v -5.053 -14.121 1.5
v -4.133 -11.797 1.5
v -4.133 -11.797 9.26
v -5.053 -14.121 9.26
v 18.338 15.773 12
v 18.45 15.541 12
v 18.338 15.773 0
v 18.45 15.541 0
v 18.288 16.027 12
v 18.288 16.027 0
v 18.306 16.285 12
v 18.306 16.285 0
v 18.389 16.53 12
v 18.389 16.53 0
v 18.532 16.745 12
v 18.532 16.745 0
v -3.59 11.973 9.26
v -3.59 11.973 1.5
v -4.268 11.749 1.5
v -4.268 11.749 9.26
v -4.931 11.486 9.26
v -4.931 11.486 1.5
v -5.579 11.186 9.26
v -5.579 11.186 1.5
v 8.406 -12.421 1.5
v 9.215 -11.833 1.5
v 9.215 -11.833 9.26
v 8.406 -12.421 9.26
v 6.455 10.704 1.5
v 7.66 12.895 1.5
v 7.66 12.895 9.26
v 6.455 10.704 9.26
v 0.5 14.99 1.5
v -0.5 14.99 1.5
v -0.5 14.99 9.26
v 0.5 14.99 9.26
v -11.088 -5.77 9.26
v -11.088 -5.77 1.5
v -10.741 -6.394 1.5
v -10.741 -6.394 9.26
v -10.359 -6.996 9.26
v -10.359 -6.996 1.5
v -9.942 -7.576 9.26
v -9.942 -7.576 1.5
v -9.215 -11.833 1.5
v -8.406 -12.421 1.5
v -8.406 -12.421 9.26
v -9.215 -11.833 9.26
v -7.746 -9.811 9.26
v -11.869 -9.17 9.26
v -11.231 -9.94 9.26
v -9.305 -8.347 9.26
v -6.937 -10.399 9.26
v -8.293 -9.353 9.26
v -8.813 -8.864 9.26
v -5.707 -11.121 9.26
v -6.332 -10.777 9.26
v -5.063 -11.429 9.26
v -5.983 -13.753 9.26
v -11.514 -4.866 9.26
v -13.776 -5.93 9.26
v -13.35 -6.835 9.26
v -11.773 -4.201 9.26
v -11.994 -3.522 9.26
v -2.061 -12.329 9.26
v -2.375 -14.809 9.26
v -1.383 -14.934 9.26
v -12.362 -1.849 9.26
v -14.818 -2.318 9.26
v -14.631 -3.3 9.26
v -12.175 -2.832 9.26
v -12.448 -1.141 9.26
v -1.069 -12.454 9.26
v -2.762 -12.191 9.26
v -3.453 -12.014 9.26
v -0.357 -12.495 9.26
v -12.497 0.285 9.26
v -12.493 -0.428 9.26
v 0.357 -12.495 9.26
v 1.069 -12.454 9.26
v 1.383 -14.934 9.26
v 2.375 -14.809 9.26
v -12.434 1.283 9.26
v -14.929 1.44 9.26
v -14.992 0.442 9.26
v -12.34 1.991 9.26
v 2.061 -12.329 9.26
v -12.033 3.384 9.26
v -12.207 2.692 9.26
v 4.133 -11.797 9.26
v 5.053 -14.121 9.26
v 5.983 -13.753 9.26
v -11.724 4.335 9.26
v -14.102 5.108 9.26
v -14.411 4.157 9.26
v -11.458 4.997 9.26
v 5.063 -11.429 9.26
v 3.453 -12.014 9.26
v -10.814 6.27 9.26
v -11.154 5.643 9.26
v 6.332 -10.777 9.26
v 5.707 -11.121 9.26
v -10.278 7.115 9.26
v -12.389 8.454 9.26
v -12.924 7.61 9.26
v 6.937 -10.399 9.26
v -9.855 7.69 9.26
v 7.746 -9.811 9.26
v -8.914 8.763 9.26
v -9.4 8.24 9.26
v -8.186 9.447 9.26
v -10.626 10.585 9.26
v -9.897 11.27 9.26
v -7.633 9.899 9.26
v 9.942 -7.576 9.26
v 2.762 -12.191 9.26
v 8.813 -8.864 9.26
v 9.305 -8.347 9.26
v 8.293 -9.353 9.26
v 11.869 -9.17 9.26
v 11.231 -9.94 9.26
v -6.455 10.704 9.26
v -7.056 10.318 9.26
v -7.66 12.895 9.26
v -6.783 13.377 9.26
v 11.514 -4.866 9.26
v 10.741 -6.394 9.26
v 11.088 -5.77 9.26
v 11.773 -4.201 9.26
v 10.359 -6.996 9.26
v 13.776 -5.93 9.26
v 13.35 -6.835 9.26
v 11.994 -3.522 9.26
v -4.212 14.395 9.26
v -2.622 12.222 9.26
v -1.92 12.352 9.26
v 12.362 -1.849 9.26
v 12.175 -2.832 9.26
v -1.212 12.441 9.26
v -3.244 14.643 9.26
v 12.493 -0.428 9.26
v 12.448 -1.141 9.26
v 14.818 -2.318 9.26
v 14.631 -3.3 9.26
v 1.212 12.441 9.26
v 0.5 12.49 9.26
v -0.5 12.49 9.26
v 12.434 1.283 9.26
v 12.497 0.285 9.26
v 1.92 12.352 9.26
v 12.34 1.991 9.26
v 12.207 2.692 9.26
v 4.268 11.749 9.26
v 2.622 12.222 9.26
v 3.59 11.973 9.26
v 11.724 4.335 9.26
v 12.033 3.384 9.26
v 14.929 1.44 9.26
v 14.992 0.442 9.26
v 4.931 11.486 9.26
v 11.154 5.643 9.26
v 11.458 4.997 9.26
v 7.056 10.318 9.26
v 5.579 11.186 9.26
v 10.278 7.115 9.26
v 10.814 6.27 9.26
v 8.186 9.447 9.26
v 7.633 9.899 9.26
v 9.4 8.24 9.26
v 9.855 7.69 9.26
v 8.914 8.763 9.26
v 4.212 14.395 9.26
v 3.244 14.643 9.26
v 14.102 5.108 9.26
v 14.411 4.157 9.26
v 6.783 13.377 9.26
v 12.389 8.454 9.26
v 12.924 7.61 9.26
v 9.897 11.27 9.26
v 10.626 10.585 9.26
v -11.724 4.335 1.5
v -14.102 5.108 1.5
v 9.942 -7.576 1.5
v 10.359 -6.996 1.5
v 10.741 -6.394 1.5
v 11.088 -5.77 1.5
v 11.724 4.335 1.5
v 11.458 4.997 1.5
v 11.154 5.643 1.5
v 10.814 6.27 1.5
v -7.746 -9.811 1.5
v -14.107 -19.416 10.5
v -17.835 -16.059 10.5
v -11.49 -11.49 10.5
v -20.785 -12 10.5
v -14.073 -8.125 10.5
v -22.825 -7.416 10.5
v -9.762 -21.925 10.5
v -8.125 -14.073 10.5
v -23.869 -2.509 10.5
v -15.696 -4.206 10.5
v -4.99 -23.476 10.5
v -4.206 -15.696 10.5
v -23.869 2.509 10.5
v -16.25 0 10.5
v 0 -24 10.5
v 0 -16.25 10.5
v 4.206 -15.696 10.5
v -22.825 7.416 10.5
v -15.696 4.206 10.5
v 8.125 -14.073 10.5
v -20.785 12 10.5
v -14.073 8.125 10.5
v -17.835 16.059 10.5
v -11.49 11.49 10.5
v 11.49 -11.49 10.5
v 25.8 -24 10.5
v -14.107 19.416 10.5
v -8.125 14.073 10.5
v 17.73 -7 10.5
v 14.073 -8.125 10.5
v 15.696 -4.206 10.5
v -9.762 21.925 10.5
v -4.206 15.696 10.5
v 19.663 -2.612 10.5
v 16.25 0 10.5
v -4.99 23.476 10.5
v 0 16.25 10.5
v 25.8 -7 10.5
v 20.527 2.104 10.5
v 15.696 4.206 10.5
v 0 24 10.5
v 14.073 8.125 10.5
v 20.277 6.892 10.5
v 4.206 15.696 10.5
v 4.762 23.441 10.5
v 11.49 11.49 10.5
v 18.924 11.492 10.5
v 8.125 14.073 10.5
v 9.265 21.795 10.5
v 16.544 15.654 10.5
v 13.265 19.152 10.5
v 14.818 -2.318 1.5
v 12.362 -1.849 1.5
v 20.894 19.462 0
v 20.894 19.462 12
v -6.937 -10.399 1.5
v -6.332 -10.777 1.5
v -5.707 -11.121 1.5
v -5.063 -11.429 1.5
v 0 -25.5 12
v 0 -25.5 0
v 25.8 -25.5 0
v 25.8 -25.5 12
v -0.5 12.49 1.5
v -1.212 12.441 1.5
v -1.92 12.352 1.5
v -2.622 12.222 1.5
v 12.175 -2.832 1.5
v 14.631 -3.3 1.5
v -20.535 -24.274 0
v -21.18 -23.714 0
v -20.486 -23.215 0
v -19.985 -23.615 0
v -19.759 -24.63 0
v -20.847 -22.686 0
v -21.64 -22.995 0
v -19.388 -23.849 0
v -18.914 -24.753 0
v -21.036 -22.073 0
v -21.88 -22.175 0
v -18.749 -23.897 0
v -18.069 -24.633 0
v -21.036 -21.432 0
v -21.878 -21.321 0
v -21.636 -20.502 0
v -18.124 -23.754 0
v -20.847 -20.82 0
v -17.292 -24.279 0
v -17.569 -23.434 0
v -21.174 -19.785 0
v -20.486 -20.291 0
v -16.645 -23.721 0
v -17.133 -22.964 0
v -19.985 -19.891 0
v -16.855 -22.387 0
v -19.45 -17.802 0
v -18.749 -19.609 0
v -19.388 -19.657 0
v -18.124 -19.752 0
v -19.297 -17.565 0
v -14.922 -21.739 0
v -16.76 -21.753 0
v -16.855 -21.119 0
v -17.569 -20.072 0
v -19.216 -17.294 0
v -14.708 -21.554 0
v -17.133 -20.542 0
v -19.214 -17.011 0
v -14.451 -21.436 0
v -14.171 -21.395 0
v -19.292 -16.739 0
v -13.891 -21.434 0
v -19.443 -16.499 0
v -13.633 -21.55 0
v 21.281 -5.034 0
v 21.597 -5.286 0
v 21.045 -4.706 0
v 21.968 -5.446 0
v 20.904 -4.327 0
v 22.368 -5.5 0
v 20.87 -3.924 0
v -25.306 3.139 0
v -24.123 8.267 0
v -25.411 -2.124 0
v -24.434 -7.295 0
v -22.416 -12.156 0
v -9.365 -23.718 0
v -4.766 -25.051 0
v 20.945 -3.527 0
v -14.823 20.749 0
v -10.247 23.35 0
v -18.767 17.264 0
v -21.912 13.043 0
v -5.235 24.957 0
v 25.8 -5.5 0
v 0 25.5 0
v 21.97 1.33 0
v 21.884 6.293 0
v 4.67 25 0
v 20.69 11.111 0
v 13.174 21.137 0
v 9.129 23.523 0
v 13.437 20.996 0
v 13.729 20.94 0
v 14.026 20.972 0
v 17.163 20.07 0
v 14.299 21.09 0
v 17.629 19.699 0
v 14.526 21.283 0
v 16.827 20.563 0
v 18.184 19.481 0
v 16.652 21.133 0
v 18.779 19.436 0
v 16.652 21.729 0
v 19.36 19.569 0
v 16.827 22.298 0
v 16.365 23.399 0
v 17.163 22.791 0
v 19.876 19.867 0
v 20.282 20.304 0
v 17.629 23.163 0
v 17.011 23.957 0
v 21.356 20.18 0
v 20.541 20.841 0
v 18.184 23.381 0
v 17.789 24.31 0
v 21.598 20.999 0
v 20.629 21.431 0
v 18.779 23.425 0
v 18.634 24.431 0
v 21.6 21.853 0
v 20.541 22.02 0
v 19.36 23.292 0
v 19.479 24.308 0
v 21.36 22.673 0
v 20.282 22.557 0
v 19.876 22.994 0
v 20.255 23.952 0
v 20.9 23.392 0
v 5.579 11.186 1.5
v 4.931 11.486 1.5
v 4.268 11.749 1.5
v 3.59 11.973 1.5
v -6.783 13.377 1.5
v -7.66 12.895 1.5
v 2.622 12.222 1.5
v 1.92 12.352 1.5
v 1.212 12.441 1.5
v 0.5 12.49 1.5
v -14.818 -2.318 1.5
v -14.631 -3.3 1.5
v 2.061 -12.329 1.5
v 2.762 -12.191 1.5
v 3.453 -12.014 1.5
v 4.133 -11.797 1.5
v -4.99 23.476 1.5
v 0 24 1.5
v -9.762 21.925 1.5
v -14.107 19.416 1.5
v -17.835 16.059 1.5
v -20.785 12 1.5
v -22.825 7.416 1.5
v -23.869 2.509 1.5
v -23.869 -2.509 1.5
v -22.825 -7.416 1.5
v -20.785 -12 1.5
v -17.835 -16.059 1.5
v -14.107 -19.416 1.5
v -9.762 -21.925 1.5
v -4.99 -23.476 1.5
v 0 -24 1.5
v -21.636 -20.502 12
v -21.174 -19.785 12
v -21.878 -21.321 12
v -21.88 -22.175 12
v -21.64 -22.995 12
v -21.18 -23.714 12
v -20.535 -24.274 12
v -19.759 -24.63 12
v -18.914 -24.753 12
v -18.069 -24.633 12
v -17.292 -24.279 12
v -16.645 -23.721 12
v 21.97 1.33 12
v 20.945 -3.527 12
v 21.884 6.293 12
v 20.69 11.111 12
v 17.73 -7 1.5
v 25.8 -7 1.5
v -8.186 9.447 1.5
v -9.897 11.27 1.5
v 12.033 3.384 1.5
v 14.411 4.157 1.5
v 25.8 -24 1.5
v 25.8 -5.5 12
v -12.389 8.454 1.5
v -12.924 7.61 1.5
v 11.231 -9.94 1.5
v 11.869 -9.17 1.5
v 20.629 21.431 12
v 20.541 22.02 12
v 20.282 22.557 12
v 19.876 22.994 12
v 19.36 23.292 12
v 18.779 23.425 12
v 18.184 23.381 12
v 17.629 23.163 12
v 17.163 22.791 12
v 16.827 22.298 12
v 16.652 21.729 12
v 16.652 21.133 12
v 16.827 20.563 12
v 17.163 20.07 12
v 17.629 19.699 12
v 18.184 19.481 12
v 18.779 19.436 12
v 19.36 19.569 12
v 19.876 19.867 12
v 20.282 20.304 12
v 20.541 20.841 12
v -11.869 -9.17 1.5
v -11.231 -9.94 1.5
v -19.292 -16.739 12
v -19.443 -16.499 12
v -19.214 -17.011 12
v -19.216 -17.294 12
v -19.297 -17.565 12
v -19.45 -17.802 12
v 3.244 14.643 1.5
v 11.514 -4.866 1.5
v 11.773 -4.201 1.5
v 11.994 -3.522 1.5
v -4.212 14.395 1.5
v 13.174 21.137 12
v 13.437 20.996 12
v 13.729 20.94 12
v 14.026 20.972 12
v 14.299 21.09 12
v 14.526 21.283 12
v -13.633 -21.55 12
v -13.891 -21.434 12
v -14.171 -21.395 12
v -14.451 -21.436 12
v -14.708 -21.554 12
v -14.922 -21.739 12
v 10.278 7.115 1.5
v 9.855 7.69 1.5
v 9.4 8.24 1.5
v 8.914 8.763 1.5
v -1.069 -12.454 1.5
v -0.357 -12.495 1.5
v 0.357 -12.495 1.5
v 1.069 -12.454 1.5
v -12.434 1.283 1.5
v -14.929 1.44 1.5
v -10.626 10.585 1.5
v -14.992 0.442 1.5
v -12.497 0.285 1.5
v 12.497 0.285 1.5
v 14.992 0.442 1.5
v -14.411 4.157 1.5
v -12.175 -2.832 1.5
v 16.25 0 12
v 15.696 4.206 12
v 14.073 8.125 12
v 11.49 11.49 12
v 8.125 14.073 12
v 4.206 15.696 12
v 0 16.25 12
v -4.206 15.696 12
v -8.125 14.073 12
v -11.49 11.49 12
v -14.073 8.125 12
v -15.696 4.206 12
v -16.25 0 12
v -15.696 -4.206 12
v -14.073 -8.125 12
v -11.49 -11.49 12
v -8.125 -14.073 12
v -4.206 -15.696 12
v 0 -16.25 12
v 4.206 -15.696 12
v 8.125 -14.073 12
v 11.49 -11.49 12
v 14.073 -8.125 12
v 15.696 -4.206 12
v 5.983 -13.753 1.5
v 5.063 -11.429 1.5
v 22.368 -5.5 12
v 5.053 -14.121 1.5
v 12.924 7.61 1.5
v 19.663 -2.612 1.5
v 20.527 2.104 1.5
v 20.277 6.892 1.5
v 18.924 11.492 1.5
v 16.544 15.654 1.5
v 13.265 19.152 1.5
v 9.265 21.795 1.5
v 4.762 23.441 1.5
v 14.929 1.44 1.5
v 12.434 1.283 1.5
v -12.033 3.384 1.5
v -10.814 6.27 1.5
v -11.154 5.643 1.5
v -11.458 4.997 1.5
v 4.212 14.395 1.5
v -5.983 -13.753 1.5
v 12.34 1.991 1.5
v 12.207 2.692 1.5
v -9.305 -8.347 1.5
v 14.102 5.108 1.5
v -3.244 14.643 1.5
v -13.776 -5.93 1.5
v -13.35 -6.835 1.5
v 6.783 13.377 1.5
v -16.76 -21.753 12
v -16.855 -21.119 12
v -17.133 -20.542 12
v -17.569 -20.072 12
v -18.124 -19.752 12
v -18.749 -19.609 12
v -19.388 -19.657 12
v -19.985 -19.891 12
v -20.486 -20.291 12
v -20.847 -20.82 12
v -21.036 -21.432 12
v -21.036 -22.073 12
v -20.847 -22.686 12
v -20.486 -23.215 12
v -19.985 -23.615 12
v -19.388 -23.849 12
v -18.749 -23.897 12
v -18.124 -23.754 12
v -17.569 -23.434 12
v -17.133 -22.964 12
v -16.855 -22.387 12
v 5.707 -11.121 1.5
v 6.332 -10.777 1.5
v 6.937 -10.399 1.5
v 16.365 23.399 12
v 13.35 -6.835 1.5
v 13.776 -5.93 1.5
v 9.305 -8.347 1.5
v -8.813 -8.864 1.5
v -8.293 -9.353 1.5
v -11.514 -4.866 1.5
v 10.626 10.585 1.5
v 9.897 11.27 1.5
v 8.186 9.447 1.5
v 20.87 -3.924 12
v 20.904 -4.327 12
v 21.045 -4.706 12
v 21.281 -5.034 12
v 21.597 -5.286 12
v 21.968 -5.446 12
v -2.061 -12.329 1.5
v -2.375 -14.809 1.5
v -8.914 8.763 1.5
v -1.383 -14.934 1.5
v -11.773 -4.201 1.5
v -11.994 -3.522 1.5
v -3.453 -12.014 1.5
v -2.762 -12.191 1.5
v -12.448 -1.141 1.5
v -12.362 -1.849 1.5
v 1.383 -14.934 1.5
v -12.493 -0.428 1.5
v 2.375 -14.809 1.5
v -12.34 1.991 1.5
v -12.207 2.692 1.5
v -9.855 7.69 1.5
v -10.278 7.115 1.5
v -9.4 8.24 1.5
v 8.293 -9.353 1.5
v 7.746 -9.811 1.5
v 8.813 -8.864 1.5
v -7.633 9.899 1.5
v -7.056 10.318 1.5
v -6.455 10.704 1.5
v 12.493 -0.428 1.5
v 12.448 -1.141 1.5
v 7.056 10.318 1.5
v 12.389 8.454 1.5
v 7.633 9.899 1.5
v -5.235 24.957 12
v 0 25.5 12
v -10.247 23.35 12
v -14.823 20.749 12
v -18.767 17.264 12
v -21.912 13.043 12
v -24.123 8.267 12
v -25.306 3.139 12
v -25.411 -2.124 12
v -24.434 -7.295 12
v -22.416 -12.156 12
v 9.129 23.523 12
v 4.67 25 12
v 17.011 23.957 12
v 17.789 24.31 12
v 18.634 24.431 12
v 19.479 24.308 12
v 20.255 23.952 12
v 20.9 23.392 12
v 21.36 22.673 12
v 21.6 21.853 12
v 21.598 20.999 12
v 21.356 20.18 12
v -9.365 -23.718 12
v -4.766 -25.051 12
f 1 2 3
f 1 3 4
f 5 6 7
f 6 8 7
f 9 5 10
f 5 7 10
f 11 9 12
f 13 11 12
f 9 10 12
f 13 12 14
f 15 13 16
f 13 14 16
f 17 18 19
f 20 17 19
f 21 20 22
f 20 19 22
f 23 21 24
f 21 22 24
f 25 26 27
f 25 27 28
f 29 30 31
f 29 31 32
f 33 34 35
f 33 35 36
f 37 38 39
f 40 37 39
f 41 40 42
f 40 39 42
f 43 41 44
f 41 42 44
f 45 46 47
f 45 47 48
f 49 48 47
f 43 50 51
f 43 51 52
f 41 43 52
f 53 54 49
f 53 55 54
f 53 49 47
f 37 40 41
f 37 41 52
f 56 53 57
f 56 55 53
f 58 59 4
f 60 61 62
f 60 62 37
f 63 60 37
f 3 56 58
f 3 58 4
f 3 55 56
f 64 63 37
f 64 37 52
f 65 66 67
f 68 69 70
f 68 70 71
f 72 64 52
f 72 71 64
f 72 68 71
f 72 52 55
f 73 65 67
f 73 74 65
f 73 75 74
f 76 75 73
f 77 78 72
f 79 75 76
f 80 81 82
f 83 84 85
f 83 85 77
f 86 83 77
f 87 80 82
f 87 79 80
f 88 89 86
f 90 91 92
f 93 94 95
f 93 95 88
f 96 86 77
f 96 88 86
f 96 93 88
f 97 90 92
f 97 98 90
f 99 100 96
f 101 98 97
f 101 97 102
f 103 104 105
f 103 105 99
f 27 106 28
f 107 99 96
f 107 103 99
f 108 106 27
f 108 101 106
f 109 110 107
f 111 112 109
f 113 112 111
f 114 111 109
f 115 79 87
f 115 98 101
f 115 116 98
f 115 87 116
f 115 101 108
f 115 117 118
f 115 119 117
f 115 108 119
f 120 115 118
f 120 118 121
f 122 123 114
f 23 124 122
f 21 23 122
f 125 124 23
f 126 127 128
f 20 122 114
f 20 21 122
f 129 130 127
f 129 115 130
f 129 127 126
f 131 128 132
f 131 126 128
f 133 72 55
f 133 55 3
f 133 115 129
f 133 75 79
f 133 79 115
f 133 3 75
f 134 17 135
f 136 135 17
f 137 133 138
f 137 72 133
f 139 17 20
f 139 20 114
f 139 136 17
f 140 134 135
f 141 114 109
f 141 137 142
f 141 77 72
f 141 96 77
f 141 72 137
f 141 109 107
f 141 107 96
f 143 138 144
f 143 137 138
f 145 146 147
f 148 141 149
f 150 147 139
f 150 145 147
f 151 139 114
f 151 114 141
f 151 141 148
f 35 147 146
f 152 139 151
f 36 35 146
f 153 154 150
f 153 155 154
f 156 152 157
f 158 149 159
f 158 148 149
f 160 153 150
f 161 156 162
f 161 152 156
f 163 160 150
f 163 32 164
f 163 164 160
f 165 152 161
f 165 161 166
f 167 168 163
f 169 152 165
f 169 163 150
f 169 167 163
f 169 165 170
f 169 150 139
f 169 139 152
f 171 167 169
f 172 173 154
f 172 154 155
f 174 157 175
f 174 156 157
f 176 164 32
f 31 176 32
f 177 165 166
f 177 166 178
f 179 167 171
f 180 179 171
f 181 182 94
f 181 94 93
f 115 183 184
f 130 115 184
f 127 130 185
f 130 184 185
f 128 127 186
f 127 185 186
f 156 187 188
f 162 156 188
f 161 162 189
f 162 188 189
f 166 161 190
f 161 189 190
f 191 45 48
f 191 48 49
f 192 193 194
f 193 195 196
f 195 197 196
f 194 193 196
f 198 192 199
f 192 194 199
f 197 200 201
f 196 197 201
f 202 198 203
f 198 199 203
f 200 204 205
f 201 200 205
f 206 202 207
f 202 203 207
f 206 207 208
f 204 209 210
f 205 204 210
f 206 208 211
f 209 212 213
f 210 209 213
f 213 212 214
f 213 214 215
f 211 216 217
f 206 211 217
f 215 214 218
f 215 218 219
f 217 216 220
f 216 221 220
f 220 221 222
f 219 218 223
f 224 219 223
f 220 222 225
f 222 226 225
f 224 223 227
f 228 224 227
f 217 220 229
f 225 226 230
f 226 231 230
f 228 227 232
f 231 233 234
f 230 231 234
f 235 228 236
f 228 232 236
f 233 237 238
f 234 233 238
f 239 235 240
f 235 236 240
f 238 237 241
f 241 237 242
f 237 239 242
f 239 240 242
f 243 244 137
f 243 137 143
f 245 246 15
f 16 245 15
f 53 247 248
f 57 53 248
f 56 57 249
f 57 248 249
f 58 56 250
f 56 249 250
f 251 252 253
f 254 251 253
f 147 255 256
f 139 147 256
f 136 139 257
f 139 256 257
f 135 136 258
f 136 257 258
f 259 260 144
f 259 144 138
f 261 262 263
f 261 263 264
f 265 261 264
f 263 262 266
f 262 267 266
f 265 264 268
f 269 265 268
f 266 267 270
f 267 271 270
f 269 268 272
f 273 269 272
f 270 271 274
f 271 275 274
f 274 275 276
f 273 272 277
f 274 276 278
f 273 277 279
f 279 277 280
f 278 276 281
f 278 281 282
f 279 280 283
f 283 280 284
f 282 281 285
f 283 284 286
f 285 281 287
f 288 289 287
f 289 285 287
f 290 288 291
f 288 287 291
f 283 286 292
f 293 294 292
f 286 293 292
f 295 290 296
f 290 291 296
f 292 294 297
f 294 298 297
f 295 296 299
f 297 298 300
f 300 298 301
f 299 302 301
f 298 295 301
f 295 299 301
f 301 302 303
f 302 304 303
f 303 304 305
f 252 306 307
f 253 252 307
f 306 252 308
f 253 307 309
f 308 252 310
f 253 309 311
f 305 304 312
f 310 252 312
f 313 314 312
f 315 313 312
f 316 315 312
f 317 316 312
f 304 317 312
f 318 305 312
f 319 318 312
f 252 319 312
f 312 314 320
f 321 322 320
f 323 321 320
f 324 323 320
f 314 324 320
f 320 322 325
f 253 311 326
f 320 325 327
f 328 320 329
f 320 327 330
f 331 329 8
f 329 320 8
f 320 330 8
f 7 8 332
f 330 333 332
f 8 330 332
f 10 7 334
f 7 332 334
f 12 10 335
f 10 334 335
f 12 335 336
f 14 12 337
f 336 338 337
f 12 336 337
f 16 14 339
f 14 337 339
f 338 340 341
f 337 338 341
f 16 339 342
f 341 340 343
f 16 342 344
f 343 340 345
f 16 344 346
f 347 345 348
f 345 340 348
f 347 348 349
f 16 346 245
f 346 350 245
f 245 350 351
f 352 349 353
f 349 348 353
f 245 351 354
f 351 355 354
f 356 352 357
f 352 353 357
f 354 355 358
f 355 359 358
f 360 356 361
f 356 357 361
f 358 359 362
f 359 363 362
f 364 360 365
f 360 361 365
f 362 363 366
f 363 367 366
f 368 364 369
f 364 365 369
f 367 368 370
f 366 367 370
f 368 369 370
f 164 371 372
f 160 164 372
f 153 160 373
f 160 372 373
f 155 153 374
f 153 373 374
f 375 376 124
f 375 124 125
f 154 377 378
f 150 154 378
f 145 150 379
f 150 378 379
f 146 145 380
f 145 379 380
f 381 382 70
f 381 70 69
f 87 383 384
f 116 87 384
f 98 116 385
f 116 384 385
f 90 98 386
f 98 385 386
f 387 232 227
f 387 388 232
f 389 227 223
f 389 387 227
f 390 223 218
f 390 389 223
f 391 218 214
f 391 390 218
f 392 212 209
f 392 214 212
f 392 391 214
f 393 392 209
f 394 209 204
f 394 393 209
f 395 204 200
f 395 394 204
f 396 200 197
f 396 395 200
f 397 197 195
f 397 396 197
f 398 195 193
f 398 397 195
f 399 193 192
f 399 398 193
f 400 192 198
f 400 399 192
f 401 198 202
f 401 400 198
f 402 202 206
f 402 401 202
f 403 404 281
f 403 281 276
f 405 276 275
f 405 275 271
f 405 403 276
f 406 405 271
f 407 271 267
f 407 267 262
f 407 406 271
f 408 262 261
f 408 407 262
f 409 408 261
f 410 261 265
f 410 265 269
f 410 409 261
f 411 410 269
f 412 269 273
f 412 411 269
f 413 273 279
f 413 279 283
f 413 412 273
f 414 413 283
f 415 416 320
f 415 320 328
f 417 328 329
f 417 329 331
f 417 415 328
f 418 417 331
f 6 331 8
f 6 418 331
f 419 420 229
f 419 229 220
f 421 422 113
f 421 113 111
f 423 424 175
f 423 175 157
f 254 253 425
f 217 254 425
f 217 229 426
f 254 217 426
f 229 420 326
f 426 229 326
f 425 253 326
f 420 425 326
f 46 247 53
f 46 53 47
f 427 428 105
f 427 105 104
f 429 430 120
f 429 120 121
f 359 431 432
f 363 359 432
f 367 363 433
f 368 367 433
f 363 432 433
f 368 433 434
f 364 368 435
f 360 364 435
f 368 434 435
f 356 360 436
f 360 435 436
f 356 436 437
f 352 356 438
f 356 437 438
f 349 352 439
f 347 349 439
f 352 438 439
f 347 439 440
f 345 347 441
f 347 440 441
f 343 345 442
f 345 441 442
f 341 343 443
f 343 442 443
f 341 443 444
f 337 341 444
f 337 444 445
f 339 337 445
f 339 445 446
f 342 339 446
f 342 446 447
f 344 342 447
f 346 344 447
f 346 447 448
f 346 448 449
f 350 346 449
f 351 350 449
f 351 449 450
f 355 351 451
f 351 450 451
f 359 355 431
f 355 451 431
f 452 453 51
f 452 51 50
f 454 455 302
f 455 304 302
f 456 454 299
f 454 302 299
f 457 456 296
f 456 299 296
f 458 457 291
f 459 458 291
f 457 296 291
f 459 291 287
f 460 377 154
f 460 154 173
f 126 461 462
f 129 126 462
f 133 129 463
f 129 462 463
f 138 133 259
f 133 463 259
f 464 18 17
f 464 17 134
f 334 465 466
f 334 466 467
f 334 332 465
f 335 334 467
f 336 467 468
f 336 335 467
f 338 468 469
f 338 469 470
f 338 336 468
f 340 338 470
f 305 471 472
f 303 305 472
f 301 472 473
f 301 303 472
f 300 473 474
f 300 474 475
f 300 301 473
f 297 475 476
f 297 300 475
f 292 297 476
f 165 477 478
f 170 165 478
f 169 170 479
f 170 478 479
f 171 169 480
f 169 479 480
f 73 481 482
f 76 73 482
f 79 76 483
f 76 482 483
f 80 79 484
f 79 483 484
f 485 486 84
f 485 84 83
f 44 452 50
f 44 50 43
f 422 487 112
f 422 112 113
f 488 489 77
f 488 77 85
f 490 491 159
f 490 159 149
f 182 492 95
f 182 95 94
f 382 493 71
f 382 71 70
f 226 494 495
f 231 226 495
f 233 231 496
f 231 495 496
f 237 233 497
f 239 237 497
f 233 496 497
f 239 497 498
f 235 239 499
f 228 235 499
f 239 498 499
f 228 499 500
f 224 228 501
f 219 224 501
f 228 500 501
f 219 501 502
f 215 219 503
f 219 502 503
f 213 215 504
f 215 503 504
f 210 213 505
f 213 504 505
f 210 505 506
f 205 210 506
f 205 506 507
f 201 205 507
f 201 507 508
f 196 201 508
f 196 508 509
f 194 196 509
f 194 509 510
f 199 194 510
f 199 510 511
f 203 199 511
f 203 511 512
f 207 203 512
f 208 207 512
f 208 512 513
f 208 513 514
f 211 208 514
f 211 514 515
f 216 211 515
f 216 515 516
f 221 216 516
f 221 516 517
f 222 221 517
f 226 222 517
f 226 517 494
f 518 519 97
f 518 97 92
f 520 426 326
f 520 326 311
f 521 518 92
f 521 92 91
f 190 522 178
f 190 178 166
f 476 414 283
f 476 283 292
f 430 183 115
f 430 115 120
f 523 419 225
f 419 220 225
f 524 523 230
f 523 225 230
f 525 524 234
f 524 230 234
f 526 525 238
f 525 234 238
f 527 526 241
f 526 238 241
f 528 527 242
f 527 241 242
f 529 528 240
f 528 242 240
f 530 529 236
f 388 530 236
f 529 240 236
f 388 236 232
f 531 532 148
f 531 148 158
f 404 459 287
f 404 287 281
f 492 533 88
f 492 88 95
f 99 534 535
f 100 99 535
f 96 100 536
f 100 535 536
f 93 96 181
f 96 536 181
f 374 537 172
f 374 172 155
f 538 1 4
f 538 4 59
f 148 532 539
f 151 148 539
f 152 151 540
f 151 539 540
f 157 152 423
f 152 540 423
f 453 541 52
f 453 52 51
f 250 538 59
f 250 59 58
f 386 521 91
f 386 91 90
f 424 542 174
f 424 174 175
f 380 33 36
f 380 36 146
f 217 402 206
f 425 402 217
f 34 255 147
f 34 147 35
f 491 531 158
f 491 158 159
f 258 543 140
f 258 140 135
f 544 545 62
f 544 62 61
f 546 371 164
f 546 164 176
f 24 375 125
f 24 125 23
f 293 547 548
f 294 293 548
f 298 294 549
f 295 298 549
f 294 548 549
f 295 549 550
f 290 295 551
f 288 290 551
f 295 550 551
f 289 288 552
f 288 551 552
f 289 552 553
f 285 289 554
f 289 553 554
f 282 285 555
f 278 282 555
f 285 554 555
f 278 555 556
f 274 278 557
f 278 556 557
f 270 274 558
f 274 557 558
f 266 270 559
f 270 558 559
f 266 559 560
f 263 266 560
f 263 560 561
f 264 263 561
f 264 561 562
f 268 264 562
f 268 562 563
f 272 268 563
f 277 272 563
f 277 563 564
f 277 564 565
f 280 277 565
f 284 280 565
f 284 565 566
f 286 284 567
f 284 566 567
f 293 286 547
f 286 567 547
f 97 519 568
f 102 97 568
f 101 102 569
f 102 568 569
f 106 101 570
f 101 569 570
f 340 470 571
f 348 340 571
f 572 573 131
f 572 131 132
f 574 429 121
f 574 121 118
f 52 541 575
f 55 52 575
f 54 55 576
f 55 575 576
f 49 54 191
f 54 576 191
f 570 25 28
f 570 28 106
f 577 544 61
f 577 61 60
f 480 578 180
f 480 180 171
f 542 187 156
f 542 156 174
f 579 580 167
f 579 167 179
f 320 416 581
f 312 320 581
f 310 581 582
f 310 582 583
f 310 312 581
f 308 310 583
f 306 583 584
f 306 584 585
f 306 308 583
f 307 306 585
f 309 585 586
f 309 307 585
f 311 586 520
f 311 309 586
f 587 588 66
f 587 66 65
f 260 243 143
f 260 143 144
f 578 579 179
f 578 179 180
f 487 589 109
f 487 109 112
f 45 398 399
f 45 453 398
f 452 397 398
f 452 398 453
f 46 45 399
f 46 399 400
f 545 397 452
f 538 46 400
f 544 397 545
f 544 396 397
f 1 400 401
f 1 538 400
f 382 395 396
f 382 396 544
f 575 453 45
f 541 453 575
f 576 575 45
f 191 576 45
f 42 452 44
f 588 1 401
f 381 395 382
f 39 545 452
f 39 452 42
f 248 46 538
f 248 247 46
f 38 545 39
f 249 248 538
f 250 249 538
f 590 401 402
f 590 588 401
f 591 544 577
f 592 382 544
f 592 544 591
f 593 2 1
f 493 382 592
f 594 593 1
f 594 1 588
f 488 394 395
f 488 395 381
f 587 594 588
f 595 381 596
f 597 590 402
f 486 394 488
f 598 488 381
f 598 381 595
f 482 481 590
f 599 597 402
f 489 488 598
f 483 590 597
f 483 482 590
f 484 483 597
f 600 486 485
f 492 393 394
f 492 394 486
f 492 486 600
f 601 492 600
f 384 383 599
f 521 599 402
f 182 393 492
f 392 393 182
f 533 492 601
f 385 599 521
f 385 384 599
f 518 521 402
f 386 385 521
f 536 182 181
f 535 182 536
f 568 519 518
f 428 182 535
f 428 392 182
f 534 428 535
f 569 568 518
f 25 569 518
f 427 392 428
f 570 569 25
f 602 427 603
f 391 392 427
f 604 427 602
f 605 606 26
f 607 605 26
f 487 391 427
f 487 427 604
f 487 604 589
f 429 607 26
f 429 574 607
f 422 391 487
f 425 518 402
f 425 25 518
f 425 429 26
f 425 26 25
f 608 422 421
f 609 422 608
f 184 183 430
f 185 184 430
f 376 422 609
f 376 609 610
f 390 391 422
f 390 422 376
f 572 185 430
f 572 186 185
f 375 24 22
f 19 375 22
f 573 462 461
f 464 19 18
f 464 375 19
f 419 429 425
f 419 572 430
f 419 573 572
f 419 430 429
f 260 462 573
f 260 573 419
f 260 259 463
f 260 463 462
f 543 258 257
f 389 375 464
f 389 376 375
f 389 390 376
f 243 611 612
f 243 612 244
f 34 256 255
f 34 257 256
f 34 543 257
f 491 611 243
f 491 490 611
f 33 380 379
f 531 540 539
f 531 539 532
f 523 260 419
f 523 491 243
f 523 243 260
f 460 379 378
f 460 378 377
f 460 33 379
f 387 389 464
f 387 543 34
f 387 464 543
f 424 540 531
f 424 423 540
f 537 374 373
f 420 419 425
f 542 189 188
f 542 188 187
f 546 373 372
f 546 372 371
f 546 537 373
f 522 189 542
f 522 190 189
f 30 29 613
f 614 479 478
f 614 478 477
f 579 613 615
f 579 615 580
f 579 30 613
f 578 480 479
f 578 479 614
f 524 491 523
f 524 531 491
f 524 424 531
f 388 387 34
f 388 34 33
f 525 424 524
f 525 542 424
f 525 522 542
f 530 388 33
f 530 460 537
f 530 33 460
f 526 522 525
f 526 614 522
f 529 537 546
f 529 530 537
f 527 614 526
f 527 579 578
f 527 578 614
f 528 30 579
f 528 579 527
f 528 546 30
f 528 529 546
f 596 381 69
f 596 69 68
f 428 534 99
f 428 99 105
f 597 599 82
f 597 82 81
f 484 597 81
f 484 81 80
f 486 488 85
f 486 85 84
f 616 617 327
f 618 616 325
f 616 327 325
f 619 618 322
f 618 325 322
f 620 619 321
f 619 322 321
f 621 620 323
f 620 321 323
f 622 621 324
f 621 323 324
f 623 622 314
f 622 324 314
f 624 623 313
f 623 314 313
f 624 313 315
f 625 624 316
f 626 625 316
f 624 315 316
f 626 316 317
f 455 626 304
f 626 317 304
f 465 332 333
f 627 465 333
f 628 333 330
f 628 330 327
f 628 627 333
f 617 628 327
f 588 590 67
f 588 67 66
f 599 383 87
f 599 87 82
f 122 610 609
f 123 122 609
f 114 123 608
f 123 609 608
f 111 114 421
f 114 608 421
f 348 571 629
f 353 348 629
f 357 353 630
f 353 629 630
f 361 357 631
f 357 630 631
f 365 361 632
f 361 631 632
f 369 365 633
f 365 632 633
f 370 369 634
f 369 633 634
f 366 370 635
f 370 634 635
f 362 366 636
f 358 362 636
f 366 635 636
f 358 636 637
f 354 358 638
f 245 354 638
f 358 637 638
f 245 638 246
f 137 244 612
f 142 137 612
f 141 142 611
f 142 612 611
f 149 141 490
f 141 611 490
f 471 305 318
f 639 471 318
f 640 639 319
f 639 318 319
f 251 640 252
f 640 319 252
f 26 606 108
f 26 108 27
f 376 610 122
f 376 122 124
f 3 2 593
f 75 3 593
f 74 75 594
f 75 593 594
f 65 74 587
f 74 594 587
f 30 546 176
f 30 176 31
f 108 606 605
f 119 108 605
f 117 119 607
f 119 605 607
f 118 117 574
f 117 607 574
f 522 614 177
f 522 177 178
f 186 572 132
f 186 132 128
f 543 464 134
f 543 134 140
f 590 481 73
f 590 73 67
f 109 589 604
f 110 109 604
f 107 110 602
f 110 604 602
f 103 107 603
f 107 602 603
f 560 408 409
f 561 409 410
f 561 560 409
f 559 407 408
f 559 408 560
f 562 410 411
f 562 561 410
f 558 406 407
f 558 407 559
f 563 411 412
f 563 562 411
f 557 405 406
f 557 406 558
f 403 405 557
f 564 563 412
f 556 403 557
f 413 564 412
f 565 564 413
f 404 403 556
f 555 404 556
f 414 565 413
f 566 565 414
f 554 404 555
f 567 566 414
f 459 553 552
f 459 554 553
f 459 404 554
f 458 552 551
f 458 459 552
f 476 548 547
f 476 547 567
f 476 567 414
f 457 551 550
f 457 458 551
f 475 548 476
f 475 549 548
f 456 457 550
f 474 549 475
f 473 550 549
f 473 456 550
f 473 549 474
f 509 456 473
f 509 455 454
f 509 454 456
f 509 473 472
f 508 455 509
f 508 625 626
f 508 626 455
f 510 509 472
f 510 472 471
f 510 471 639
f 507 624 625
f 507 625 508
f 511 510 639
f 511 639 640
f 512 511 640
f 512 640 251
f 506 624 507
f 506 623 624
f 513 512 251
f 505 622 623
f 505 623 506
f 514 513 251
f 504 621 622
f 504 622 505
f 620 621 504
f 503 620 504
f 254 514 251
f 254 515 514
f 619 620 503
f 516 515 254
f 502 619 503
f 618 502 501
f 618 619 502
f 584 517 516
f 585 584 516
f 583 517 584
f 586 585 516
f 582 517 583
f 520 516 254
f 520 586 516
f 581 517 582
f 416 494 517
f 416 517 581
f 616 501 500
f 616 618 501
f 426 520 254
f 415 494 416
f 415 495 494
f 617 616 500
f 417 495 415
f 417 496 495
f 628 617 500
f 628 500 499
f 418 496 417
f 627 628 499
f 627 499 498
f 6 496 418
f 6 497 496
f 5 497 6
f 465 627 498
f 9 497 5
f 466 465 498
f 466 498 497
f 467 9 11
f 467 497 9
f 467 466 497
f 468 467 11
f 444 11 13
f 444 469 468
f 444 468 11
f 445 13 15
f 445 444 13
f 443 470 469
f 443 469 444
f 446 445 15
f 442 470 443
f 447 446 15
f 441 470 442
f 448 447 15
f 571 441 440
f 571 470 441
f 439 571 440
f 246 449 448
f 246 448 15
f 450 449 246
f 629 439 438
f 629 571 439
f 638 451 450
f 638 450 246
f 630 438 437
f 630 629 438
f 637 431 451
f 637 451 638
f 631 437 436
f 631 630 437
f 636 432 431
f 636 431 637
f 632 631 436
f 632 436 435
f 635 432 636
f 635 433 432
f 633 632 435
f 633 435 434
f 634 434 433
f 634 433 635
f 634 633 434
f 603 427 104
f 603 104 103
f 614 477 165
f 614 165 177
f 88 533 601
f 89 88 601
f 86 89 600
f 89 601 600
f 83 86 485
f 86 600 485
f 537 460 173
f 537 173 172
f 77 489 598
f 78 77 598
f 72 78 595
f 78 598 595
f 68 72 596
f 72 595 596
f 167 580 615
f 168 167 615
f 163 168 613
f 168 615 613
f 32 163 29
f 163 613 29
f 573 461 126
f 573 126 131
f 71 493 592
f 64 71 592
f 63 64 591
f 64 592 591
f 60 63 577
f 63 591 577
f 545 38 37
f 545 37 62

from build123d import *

# Parameters (mm, degrees)
BOSS_EXTRUDE1_DEPTH = 12
CUT_EXTRUDE2_DEPTH  = 28.5
SHELL1_T            = -1.5
SKETCH2_R           = 16.25
CUT_EXTRUDE1_DEPTH  = 3.76
SKETCH3_R           = 12.5
BOSS_EXTRUDE2_DEPTH = 7.76
BOSS_EXTRUDE3_DEPTH = 7.76
CIRPATTERN1_COUNT   = 25
FILLET1_R           = 1.5
SKETCH6_R           = 2.15
BOSS_EXTRUDE4_DEPTH = 12
FILLET2_R           = 1
SKETCH7_R           = 2
BOSS_EXTRUDE5_DEPTH = 12
FILLET3_R           = 1


with BuildPart() as part:
    # Sketch1 → Boss-Extrude1 (new body)
    with BuildSketch(Plane.XY):
        with BuildLine():
            Line((0, -25.5), (25.8, -25.5))
            Line((25.8, -25.5), (25.8, -5.5))
            Line((25.8, -5.5), (24.899799196, -5.5))
            ThreePointArc((24.899799196, -5.5), (-15.968719423, 19.880895352), (0, -25.5))
        make_face()
    extrude(amount=BOSS_EXTRUDE1_DEPTH)

    # Sketch5 → Cut-Extrude2 (cut)
    with BuildSketch(Plane.XY.offset(12)):
        with BuildLine():
            Line((24.899799196, -5.5), (20.18266583, -5.5))
            ThreePointArc((20.18266583, -5.5), (18.495540003, 15.471590427), (0, 25.5))
            ThreePointArc((0, 25.5), (19.880895352, 15.968719423), (24.899799196, -5.5))
        make_face()
    extrude(amount=-CUT_EXTRUDE2_DEPTH, mode=Mode.SUBTRACT)

    # Shell1
    shell1_openings = [part.faces().sort_by_distance(p)[0] for p in [
        (25.8, -15.5, 6),
    ]]
    offset(amount=SHELL1_T, openings=shell1_openings, kind=Kind.INTERSECTION)

    # Sketch2 → Cut-Extrude1 (cut)
    with BuildSketch(Plane.XY.offset(12)):
        Circle(SKETCH2_R)
    extrude(amount=-CUT_EXTRUDE1_DEPTH, mode=Mode.SUBTRACT)

    # Sketch3 → Boss-Extrude2 (add)
    with BuildSketch(Plane.XY.offset(1.5)):
        Circle(SKETCH3_R)
    extrude(amount=BOSS_EXTRUDE2_DEPTH)

    # Sketch4 → Boss-Extrude3 (add)
    with BuildSketch(Plane.XY.offset(1.5)):
        with BuildLine():
            Line((-0.5, 12.489995997), (-0.5, 14.989995997))
            Line((-0.5, 14.989995997), (0.5, 14.989995997))
            Line((0.5, 14.989995997), (0.5, 12.489995997))
            ThreePointArc((0.5, 12.489995997), (0, 12.5), (-0.5, 12.489995997))
        make_face()
    boss_extrude3 = extrude(amount=BOSS_EXTRUDE3_DEPTH)

    # CirPattern1: Boss-Extrude3 ×25 about axis
    cirpattern1_axis = Axis((0, 0, 0), (0, 0, 1))
    for i in range(1, CIRPATTERN1_COUNT):
        add(boss_extrude3.rotate(cirpattern1_axis, i * 360 / CIRPATTERN1_COUNT))

    # Fillet1
    fillet1_edges = [part.edges().sort_by_distance(p)[0] for p in [
        (20.18266583, -5.5, 6),
    ]]
    fillet(fillet1_edges, radius=FILLET1_R)

    # Sketch6 → Boss-Extrude4 (add)
    with BuildSketch(Plane.XY.offset(12)):
        with BuildLine():
            Line((-18.877455455, -17.143269104), (-21.173662056, -19.784752634))
            ThreePointArc((-21.173662056, -19.784752634), (-20.877710402, -24.017058462), (-16.645404575, -23.721106808))
            Line((-16.645404575, -23.721106808), (-14.349197973, -21.079623278))
            ThreePointArc((-14.349197973, -21.079623278), (-16.729505239, -19.245094296), (-18.877455455, -17.143269104))
        make_face()
        with Locations((-18.909533315, -21.752929721)):
            Circle(SKETCH6_R, mode=Mode.SUBTRACT)
    extrude(amount=-BOSS_EXTRUDE4_DEPTH)

    # Fillet2
    fillet2_edges = [part.edges().sort_by_distance(p)[0] for p in [
        (-14.349197973, -21.079623278, 6),
        (-18.877455455, -17.143269104, 6),
    ]]
    fillet(fillet2_edges, radius=FILLET2_R)

    # Sketch7 → Boss-Extrude5 (add)
    with BuildSketch(Plane.XY.offset(12)):
        with BuildLine():
            Line((13.905047135, 20.568686185), (16.365268494, 23.398847111))
            ThreePointArc((16.365268494, 23.398847111), (20.597574322, 23.694798765), (20.893525975, 19.462492937))
            Line((20.893525975, 19.462492937), (18.02598514, 16.163764554))
            ThreePointArc((18.02598514, 16.163764554), (16.116716142, 18.507677567), (13.905047135, 20.568686185))
        make_face()
        with Locations((18.629397235, 21.430670024)):
            Circle(SKETCH7_R, mode=Mode.SUBTRACT)
    extrude(amount=-BOSS_EXTRUDE5_DEPTH)

    # Fillet3
    fillet3_edges = [part.edges().sort_by_distance(p)[0] for p in [
        (13.905047135, 20.568686185, 6),
        (18.02598514, 16.163764554, 6),
    ]]
    fillet(fillet3_edges, radius=FILLET3_R)


solid = part.part
